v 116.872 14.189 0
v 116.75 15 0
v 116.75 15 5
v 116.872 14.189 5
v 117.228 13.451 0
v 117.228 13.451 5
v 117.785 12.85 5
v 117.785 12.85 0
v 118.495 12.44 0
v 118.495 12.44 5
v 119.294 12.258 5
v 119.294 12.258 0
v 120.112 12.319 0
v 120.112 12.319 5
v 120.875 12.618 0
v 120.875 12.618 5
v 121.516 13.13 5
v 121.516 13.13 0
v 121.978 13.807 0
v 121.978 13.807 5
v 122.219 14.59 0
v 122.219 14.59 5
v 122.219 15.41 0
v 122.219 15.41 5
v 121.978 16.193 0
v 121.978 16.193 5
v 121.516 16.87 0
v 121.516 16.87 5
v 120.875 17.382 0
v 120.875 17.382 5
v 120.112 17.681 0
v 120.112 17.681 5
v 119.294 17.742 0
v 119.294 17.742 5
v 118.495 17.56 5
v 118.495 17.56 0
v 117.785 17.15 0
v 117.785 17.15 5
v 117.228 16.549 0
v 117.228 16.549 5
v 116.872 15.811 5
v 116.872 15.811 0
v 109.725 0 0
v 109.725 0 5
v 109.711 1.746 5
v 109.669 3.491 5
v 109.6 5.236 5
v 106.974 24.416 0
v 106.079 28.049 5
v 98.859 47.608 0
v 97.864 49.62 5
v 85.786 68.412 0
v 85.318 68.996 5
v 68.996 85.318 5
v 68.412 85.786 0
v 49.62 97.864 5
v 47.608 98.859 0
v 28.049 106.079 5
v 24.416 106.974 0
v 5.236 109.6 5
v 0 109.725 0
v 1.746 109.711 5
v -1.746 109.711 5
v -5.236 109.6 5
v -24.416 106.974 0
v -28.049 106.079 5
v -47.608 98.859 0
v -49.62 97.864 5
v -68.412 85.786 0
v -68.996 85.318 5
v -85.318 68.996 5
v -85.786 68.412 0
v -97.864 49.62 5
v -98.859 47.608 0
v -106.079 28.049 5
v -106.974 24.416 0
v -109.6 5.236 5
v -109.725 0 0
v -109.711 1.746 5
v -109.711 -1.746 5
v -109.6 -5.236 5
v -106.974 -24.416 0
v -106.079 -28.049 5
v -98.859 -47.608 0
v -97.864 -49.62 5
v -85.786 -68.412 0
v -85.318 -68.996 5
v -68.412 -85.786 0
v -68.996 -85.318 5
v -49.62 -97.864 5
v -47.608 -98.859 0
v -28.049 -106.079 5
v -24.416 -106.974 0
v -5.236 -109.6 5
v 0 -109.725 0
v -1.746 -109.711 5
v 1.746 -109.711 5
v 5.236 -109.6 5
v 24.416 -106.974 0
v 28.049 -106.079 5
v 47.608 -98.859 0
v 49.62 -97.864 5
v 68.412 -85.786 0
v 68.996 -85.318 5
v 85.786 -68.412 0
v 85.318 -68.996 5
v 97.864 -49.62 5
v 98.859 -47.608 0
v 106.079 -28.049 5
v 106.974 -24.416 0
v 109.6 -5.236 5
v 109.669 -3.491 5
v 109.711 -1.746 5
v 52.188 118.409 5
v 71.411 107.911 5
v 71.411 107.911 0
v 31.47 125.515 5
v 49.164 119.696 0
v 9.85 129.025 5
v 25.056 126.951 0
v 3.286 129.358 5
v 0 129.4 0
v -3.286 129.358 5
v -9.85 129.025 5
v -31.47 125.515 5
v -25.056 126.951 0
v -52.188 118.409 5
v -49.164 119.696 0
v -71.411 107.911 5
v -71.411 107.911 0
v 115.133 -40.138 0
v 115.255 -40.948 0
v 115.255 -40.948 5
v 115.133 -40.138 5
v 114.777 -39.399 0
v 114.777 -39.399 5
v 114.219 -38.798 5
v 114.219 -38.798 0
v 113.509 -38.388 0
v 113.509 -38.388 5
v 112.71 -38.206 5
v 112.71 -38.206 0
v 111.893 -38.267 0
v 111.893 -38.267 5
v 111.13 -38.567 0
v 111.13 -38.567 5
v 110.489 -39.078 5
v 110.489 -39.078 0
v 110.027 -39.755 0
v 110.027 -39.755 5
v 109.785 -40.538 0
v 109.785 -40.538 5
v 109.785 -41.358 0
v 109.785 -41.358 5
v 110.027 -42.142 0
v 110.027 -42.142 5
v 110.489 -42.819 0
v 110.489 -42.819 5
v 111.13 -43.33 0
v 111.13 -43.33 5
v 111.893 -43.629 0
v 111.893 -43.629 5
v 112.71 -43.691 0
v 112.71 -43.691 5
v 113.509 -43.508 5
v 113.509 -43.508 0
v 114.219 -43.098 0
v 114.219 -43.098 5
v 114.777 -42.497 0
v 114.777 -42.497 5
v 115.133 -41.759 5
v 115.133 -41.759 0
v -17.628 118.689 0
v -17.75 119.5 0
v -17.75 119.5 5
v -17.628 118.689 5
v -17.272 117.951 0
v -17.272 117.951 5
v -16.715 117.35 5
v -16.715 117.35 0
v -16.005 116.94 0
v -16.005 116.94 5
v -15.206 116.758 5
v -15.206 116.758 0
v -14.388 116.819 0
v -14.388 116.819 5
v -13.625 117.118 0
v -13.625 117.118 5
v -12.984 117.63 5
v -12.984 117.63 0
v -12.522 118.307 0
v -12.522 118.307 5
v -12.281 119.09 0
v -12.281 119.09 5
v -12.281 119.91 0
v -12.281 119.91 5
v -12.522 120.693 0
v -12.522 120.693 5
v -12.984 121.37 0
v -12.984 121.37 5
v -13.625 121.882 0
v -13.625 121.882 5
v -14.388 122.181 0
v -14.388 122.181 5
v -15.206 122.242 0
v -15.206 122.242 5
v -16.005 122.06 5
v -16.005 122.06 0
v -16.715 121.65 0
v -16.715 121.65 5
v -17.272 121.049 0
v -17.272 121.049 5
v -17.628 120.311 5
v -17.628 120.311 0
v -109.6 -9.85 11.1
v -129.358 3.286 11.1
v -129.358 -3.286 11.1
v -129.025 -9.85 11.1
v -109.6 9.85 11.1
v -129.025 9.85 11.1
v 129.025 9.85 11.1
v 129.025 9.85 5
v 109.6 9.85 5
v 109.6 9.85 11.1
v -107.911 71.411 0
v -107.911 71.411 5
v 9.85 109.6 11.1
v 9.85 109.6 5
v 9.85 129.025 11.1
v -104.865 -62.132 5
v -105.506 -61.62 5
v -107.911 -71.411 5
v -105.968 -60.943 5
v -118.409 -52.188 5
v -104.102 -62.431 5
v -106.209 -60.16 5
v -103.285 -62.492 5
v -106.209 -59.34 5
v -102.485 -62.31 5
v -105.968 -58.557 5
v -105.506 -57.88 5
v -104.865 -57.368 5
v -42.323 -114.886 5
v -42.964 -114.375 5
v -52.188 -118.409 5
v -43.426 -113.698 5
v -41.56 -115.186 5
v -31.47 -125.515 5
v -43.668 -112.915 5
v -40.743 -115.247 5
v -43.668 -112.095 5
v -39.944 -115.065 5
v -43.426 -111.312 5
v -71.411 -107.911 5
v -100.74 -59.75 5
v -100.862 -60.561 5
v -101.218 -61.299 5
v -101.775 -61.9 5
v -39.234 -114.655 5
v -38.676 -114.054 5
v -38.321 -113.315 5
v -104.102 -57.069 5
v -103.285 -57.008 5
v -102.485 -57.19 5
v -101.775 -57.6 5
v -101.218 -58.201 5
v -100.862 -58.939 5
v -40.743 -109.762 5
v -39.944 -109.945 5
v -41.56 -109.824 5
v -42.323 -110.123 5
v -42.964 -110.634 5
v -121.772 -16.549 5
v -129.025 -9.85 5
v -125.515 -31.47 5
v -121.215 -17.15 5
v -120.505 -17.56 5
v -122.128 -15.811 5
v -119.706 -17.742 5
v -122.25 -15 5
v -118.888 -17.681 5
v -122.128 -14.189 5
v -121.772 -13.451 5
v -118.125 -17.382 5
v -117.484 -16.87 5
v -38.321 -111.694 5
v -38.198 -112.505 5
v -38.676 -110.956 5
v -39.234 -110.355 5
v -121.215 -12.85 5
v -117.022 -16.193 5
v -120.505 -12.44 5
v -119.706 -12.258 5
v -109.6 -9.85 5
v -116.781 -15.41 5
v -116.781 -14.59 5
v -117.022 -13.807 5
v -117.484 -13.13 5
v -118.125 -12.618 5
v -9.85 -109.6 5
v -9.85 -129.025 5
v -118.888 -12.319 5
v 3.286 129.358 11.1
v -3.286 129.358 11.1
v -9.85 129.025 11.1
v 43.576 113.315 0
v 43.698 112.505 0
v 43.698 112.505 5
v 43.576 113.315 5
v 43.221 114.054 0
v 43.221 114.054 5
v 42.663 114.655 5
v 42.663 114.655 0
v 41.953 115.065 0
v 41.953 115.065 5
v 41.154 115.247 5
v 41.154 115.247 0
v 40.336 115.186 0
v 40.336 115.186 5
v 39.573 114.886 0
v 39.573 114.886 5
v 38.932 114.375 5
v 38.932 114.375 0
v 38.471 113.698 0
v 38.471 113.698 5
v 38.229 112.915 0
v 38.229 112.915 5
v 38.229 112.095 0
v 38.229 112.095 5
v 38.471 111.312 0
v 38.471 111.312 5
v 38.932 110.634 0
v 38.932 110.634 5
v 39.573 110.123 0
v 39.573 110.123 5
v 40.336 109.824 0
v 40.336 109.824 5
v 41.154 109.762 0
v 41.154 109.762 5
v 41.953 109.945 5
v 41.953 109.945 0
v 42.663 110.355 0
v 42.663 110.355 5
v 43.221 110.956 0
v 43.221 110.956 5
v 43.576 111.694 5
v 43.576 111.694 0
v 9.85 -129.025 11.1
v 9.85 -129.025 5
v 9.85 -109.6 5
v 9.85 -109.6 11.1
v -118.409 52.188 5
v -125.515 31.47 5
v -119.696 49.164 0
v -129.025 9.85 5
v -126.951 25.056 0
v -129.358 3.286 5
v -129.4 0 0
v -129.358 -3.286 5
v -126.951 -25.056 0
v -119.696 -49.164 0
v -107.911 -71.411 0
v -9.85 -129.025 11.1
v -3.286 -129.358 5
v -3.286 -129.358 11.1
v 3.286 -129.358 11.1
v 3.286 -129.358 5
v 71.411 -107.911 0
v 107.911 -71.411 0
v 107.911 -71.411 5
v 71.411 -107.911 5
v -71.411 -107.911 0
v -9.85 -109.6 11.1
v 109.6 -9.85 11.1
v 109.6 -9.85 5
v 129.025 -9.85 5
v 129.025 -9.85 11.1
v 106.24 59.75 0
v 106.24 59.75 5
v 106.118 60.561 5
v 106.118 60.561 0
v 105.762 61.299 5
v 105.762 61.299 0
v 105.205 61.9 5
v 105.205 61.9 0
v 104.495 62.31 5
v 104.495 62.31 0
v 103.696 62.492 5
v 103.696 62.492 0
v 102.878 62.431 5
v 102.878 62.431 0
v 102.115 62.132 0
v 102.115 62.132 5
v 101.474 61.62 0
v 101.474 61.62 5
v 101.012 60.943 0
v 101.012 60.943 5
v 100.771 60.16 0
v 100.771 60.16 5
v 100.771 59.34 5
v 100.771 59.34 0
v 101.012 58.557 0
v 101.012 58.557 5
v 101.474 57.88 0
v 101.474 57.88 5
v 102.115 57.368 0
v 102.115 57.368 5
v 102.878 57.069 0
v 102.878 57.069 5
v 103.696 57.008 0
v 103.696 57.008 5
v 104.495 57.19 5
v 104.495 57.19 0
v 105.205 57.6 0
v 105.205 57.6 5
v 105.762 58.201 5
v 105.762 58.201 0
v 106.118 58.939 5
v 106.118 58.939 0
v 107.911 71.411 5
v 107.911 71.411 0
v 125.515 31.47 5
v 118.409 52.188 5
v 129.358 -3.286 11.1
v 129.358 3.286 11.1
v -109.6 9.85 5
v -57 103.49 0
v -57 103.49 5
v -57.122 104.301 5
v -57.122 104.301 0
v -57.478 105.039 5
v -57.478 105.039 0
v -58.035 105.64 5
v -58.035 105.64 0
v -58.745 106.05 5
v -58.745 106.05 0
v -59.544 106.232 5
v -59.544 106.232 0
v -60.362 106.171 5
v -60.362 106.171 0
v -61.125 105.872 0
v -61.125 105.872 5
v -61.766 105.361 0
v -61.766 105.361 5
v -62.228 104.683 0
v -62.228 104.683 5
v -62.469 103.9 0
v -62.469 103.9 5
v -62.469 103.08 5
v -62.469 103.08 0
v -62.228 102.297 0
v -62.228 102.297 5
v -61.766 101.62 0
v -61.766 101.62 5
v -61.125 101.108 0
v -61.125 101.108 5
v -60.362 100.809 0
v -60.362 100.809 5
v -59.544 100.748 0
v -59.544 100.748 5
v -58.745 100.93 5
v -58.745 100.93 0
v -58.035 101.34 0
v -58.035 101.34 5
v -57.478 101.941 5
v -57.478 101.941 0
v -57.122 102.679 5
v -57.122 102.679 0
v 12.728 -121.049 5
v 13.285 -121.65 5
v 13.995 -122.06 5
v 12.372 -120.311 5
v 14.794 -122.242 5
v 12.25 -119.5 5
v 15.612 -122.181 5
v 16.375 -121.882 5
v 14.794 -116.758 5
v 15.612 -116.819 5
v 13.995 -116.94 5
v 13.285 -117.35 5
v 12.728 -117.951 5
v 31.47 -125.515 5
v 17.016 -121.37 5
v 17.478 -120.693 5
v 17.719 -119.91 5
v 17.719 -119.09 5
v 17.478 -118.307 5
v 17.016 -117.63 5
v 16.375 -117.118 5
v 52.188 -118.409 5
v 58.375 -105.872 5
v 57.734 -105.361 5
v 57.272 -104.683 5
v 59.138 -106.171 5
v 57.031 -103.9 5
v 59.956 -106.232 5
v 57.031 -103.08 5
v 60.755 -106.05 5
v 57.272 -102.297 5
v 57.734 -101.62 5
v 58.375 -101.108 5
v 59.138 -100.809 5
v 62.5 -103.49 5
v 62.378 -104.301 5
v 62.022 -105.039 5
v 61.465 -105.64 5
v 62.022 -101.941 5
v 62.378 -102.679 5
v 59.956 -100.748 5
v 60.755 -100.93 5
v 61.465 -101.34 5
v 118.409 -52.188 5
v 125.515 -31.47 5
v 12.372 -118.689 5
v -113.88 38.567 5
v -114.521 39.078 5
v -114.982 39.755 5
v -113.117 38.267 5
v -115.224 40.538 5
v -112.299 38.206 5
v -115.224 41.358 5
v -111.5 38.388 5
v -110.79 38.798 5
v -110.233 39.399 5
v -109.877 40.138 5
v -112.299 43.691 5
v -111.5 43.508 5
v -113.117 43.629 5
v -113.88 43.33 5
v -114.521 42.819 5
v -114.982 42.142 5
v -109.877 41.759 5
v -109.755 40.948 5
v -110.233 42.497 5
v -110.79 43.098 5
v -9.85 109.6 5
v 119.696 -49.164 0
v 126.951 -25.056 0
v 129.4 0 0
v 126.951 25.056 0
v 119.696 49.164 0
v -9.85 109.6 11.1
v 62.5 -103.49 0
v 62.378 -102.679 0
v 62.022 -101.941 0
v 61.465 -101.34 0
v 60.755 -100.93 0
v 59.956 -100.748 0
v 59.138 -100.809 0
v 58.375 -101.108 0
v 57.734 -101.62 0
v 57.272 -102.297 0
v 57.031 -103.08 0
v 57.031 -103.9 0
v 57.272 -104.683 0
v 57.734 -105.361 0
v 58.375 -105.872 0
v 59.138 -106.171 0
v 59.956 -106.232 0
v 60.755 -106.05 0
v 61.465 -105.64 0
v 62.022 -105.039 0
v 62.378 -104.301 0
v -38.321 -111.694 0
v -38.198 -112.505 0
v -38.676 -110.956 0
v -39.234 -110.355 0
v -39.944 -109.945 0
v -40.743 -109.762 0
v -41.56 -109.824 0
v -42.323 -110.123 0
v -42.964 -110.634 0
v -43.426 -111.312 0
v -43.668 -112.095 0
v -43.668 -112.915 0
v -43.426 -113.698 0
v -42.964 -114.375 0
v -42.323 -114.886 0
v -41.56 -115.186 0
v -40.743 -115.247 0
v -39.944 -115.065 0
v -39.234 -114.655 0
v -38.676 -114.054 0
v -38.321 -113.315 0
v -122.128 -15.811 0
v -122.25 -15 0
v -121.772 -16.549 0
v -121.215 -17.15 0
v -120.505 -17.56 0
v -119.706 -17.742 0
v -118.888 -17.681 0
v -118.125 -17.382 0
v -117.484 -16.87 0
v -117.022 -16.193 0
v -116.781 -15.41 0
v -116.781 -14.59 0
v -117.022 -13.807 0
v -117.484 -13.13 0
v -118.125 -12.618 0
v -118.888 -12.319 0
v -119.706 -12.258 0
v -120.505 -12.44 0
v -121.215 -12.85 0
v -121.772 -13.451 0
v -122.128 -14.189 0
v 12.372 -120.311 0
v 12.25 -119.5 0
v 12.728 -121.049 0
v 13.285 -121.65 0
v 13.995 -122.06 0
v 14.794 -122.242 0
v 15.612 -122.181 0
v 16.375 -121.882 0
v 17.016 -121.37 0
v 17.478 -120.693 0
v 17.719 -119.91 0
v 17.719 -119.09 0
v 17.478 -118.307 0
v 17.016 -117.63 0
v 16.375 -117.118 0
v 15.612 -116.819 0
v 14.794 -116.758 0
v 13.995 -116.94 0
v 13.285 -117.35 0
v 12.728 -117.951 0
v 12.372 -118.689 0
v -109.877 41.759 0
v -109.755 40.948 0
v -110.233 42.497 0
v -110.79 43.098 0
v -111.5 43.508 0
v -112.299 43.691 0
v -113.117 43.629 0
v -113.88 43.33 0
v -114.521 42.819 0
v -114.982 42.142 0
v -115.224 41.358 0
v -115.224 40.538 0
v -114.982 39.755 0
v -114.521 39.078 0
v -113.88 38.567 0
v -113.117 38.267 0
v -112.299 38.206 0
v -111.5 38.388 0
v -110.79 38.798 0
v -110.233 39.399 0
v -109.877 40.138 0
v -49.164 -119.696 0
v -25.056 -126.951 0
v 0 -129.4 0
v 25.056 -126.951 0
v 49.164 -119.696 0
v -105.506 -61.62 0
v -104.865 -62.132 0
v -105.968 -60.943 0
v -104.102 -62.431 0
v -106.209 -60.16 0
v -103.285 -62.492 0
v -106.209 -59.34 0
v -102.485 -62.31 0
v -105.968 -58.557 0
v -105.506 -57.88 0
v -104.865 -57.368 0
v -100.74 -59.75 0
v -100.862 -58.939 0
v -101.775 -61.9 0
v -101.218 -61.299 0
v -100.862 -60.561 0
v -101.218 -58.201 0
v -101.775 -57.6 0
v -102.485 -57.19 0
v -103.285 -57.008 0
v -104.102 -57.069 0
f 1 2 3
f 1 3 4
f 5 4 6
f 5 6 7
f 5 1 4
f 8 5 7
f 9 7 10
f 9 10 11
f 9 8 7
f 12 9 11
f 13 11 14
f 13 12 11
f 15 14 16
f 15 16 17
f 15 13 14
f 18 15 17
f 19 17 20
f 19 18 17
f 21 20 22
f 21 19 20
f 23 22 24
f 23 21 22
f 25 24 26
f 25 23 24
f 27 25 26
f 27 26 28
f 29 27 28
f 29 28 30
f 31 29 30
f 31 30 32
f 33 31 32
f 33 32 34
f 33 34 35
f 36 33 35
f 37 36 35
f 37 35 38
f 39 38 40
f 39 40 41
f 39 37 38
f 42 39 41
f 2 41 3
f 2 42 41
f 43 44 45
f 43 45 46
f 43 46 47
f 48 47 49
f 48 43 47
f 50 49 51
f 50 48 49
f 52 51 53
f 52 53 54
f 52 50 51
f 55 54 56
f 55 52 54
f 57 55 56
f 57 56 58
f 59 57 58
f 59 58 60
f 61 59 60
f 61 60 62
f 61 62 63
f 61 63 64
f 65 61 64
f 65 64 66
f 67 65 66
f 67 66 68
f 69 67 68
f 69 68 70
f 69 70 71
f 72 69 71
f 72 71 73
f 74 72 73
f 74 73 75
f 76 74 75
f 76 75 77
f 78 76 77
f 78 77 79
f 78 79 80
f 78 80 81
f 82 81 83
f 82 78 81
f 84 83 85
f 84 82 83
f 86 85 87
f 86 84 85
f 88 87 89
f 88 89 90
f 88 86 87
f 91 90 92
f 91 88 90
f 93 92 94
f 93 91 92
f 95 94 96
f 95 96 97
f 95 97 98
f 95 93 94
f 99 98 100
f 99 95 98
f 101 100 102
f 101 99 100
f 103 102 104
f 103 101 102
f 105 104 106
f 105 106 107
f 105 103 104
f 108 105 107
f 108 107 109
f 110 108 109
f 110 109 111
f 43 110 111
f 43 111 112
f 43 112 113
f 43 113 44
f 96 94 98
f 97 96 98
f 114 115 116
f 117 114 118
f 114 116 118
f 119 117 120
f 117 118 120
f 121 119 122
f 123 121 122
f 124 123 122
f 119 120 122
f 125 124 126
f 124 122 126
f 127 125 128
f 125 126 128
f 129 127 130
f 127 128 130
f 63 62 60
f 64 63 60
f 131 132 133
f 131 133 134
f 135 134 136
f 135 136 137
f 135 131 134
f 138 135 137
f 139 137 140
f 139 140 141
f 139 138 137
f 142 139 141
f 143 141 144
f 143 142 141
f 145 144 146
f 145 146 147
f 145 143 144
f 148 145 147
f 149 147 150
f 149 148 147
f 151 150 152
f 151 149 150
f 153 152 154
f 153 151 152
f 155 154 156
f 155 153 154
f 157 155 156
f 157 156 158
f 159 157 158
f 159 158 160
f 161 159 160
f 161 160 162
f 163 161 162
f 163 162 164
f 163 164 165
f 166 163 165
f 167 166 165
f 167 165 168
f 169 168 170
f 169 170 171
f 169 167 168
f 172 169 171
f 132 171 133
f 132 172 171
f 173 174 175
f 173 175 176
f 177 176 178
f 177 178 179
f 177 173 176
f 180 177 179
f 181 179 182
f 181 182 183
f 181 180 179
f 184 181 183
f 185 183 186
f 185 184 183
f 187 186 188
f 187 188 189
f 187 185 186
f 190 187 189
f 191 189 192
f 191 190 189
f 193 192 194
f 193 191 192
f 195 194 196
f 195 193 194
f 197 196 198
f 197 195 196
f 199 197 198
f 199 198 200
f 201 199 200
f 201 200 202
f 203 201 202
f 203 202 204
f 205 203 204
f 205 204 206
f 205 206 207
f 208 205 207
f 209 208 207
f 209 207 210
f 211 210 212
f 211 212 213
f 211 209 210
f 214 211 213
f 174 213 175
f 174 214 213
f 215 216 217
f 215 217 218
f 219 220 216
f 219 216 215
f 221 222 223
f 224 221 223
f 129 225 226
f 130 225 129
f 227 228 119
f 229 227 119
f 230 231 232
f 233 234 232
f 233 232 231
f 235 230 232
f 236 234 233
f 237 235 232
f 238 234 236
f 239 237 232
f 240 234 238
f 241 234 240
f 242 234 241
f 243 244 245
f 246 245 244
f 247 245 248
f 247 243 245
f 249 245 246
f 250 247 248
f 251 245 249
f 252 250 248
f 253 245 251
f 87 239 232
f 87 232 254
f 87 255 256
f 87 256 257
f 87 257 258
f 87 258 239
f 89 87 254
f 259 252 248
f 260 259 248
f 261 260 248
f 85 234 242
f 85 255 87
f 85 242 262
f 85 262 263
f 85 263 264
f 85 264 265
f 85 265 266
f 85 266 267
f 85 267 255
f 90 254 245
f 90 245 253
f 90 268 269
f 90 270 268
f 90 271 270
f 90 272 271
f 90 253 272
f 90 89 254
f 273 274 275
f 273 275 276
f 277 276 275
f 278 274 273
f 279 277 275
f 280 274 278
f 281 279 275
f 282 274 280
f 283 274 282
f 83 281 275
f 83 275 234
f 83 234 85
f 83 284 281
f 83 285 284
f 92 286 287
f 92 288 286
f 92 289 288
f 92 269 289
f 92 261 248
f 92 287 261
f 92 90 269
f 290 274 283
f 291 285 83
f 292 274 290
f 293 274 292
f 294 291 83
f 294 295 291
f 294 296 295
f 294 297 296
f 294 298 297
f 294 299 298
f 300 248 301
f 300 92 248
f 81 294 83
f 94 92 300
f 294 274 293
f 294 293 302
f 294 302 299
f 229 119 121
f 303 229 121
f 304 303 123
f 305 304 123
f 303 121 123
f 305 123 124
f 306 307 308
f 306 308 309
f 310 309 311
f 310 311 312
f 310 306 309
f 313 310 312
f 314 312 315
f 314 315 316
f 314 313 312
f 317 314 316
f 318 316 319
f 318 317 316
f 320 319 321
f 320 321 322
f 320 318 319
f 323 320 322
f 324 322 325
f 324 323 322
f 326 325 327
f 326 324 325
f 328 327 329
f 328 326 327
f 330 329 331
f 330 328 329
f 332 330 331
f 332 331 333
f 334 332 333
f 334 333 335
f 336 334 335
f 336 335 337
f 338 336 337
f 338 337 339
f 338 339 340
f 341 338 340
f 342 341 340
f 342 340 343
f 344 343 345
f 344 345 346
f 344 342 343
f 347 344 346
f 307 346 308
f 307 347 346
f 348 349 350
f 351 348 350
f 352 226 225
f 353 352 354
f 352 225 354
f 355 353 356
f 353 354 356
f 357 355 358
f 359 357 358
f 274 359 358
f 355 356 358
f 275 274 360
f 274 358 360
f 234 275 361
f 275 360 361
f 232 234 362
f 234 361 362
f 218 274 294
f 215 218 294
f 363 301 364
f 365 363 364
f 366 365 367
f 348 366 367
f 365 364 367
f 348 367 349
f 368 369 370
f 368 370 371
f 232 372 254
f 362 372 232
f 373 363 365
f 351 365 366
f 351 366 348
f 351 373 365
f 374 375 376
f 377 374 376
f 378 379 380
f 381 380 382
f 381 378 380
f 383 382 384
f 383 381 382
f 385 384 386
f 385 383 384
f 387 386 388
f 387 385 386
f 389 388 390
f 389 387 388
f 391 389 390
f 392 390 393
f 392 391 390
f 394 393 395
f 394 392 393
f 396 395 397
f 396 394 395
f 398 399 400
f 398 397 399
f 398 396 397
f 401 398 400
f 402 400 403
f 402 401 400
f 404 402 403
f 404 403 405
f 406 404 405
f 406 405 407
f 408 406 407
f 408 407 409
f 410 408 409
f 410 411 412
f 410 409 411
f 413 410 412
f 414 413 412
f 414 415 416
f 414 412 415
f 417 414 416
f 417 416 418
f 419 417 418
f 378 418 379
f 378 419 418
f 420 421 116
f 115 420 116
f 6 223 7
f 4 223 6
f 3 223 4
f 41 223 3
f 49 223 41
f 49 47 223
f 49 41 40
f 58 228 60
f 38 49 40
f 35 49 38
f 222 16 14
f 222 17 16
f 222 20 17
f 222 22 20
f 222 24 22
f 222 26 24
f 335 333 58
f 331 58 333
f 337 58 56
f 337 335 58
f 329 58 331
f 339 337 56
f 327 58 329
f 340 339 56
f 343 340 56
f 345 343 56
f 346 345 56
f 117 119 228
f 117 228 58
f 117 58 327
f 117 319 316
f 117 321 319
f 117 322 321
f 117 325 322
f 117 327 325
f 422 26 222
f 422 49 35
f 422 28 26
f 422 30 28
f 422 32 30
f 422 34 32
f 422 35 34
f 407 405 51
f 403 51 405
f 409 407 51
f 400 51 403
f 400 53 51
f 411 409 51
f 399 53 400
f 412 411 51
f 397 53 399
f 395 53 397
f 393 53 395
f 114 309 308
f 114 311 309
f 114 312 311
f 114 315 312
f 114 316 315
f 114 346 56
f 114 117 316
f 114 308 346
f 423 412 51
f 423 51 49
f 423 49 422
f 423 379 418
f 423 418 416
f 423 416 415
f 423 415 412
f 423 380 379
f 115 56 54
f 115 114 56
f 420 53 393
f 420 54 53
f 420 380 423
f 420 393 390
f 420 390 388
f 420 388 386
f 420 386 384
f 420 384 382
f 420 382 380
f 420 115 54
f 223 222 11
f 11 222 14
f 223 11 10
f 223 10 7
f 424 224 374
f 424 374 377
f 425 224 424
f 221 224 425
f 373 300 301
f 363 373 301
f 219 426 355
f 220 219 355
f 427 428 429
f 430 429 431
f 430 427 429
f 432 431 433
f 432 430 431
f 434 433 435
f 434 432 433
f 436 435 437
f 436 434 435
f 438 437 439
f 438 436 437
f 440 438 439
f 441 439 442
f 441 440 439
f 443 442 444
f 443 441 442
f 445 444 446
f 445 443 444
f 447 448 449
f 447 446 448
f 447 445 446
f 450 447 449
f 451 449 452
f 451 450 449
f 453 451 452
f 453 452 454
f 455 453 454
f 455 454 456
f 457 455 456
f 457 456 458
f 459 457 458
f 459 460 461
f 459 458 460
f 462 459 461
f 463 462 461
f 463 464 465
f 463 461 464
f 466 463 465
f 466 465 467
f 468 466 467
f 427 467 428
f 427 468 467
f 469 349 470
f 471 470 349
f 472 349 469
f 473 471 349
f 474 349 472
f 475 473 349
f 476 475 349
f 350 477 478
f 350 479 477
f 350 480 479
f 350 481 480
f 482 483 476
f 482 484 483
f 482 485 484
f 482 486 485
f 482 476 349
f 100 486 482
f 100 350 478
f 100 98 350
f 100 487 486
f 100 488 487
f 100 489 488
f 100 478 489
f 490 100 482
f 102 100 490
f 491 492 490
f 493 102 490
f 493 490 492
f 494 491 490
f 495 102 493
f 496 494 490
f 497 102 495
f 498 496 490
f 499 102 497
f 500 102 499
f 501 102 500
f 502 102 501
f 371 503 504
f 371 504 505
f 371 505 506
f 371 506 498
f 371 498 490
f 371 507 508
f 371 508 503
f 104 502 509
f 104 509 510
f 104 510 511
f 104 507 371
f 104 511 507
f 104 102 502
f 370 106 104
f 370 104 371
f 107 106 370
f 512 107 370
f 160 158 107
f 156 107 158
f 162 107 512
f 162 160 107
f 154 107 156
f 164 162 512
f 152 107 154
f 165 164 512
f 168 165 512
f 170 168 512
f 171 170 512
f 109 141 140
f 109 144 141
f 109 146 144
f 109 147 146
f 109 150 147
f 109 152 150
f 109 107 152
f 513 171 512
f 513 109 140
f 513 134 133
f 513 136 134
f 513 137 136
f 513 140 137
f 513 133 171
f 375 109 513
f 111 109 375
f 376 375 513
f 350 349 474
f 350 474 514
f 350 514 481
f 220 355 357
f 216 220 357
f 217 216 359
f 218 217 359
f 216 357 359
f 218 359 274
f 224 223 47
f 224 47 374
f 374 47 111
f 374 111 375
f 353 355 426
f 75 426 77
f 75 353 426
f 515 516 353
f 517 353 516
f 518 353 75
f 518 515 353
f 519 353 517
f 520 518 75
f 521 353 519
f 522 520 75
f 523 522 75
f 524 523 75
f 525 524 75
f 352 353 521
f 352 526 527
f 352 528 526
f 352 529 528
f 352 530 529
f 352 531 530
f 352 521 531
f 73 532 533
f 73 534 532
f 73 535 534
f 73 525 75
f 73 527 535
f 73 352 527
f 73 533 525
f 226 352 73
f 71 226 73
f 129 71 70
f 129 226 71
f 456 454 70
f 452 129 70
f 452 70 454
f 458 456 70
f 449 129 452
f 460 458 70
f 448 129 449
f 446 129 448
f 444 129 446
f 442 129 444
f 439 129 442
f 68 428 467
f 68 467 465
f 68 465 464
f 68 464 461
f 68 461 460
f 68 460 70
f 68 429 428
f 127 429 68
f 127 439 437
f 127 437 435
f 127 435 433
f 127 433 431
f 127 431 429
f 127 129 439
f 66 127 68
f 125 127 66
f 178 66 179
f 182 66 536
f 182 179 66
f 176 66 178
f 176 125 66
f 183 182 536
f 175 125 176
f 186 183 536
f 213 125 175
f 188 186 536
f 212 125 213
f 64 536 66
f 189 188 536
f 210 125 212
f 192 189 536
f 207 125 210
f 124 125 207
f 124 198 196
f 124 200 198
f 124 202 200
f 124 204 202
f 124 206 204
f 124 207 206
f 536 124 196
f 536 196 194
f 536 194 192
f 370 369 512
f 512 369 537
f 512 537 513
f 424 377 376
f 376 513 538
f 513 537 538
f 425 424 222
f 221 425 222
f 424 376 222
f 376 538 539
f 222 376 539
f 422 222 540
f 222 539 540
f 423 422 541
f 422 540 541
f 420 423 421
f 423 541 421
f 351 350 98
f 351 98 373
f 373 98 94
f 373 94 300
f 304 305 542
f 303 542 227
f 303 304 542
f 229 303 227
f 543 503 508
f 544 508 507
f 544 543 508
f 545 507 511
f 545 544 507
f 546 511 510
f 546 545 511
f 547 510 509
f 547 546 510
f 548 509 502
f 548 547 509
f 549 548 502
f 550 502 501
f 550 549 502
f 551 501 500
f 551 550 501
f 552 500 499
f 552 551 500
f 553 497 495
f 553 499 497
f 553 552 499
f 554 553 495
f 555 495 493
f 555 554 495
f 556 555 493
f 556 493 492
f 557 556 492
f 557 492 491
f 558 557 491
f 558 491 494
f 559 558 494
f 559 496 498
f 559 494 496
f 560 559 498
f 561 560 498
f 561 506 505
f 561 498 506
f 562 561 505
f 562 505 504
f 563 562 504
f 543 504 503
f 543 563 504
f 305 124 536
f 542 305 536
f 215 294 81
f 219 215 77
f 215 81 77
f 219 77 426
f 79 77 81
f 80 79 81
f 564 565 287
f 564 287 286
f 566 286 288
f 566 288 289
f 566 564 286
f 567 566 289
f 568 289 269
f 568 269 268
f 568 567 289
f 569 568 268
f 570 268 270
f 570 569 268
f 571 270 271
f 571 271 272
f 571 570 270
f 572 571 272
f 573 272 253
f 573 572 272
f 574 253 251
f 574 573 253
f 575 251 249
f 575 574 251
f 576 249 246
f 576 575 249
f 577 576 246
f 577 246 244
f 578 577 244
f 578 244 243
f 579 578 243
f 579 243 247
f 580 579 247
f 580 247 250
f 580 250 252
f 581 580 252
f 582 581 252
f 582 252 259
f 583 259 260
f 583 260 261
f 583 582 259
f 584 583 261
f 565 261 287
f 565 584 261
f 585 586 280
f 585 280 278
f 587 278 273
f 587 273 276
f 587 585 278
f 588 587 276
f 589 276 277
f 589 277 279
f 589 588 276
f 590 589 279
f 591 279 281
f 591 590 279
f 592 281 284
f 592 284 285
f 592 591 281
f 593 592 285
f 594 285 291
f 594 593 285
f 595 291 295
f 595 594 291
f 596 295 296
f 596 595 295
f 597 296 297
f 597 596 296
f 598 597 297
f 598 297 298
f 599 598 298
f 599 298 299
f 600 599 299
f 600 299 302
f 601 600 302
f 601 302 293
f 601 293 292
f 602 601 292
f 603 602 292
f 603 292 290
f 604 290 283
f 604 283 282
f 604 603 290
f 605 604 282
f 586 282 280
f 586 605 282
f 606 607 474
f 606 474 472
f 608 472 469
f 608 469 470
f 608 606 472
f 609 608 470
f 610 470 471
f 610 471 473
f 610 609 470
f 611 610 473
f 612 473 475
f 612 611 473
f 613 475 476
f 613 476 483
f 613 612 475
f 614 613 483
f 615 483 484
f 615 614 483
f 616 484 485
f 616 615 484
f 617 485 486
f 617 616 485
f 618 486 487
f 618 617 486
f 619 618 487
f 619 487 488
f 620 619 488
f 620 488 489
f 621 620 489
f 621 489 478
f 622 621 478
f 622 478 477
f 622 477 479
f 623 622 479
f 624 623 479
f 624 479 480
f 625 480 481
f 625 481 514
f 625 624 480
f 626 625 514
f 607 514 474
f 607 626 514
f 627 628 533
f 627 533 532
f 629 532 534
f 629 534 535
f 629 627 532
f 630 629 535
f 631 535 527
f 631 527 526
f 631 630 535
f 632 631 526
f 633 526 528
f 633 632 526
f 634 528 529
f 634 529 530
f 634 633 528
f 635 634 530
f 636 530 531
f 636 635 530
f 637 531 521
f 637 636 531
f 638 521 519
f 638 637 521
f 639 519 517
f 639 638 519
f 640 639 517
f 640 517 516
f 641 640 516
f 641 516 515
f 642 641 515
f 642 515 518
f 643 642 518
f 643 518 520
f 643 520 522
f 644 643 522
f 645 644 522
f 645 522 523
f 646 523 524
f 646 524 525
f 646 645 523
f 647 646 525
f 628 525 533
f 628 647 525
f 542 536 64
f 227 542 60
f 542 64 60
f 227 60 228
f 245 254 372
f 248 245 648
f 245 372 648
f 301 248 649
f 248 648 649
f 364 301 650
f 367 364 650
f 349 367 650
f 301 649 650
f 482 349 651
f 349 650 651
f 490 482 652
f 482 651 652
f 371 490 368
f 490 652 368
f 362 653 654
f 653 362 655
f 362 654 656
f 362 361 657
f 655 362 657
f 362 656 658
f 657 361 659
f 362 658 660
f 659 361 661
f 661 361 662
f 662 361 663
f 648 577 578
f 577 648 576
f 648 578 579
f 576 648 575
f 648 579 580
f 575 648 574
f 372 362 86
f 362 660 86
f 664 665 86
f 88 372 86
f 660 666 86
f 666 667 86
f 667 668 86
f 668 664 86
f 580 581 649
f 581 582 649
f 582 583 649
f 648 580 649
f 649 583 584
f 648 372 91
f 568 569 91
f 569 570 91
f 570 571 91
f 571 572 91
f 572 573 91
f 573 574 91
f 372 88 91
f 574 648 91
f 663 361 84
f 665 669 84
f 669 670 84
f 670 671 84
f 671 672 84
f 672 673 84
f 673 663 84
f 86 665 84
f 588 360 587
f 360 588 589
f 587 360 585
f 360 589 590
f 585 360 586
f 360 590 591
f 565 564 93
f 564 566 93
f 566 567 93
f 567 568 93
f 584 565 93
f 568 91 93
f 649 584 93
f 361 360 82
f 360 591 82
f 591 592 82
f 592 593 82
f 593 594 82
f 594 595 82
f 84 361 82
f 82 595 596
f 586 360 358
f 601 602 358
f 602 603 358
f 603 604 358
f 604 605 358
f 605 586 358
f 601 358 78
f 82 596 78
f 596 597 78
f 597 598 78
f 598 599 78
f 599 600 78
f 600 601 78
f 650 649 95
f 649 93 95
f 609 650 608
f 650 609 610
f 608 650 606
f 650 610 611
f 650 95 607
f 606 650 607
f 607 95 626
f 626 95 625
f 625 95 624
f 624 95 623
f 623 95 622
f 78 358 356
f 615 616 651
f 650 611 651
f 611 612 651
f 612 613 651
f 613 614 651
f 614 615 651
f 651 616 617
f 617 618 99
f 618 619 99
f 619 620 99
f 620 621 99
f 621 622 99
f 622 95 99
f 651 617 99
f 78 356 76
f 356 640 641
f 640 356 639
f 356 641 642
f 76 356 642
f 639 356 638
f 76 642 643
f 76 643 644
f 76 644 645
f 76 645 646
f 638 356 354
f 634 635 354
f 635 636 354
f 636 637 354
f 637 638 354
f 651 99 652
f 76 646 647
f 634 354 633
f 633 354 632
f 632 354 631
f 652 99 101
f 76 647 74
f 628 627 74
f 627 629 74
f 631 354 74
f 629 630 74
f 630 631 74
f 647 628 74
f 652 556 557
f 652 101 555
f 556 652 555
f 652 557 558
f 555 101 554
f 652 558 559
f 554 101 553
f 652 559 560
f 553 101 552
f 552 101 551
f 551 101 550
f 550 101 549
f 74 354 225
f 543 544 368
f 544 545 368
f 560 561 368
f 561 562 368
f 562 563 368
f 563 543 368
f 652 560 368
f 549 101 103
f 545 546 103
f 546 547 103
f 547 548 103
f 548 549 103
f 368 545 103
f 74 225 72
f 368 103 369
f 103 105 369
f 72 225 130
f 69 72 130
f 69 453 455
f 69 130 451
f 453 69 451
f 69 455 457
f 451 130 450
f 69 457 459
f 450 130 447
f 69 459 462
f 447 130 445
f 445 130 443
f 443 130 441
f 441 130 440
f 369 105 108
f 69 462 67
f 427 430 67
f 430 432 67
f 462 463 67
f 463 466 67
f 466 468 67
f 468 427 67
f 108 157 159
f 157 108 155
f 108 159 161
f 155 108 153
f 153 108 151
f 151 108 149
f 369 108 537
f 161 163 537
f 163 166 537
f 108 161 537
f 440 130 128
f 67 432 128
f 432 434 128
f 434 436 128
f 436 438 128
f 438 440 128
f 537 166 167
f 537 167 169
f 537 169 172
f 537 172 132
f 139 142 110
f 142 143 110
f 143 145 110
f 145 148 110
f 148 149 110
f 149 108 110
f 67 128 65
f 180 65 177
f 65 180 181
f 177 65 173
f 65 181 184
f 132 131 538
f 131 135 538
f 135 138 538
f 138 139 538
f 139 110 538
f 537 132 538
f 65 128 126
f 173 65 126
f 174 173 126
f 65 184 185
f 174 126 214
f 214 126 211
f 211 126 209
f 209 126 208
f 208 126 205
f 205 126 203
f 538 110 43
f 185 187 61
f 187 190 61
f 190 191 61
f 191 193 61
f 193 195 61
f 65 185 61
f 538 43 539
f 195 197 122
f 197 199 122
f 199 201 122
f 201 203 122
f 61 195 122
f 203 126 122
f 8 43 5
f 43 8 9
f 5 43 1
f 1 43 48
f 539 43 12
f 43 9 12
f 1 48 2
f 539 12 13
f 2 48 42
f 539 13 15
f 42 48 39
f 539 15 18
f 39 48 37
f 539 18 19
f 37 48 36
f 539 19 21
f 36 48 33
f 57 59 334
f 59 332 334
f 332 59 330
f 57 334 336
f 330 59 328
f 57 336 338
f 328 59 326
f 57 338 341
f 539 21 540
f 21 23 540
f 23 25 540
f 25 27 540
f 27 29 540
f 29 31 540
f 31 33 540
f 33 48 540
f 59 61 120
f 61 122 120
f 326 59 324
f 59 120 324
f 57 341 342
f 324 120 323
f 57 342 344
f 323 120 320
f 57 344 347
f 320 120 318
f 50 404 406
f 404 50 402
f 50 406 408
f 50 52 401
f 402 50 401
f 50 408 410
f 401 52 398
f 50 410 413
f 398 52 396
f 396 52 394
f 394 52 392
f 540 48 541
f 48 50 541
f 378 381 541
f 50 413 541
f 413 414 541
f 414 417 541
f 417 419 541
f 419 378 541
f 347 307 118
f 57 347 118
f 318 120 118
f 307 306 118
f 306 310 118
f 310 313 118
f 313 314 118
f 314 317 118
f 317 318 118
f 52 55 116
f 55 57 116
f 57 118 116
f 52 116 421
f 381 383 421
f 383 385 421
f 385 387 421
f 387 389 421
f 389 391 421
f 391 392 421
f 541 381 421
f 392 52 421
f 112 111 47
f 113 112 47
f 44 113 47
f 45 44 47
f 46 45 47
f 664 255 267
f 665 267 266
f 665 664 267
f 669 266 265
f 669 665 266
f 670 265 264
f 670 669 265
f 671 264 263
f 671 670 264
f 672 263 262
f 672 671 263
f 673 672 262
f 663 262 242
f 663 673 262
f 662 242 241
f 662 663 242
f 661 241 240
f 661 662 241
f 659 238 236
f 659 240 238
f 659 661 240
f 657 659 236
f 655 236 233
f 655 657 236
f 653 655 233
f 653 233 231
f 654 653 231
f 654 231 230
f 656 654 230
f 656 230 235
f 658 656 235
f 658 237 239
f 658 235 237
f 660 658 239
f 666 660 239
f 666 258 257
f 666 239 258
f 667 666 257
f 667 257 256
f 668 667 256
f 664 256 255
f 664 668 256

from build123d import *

# Parameters (mm, degrees)
SKETCH2_R           = 129.4
SKETCH2_R_2         = 109.725
SKETCH2_R_3         = 2.75
BOSS_EXTRUDE1_DEPTH = 5
BOSS_EXTRUDE2_DEPTH = 6.1
CUT_EXTRUDE3_DEPTH  = 10
SKETCH5_R           = 2.75
CUT_EXTRUDE4_DEPTH  = 184.335566653


with BuildPart() as part:
    # Sketch2 → Boss-Extrude1 (new body)
    with BuildSketch(Plane.XY):
        Circle(SKETCH2_R)
        Circle(SKETCH2_R_2, mode=Mode.SUBTRACT)
        with Locations(Location((-15, 119.5, 0), (0, 0, 180))):
            Circle(SKETCH2_R_3, mode=Mode.SUBTRACT)
        with Locations((40.94836166, 112.504699024)):
            Circle(SKETCH2_R_3, mode=Mode.SUBTRACT)
        with Locations(Location((119.5, 15, 0), (0, 0, 180))):
            Circle(SKETCH2_R_3, mode=Mode.SUBTRACT)
        with Locations((112.504699024, -40.94836166)):
            Circle(SKETCH2_R_3, mode=Mode.SUBTRACT)
        with Locations(Location((15, -119.5, 0), (0, 0, 180))):
            Circle(SKETCH2_R_3, mode=Mode.SUBTRACT)
        with Locations((-40.94836166, -112.504699024)):
            Circle(SKETCH2_R_3, mode=Mode.SUBTRACT)
        with Locations(Location((-119.5, -15, 0), (0, 0, 180))):
            Circle(SKETCH2_R_3, mode=Mode.SUBTRACT)
        with Locations((-112.504699024, 40.94836166)):
            Circle(SKETCH2_R_3, mode=Mode.SUBTRACT)
    extrude(amount=BOSS_EXTRUDE1_DEPTH)

    # Sketch3 → Boss-Extrude2 (add)
    with BuildSketch(Plane.XY.offset(5)):
        with BuildLine():
            Line((-9.85, 129.024561615), (-9.85, 109.6))
            Line((-9.85, 109.6), (9.85, 109.6))
            Line((9.85, 109.6), (9.85, 129.024561615))
            ThreePointArc((9.85, 129.024561615), (0, 129.4), (-9.85, 129.024561615))
        make_face()
        with BuildLine():
            Line((129.024561615, 9.85), (109.6, 9.85))
            Line((109.6, 9.85), (109.6, -9.85))
            Line((109.6, -9.85), (129.024561615, -9.85))
            ThreePointArc((129.024561615, -9.85), (129.4, 0), (129.024561615, 9.85))
        make_face()
        with BuildLine():
            Line((9.85, -129.024561615), (9.85, -109.6))
            Line((9.85, -109.6), (-9.85, -109.6))
            Line((-9.85, -109.6), (-9.85, -129.024561615))
            ThreePointArc((-9.85, -129.024561615), (0, -129.4), (9.85, -129.024561615))
        make_face()
        with BuildLine():
            Line((-129.024561615, -9.85), (-109.6, -9.85))
            Line((-109.6, -9.85), (-109.6, 9.85))
            Line((-109.6, 9.85), (-129.024561615, 9.85))
            ThreePointArc((-129.024561615, 9.85), (-129.4, 0), (-129.024561615, -9.85))
        make_face()
    extrude(amount=BOSS_EXTRUDE2_DEPTH)

    # Sketch4 → Cut-Extrude3 (cut)
    with BuildSketch(Plane.XY):
        Polygon((126.8, 52.522279709), (52.522279709, 126.8), (53.640656327, 129.5), (129.5, 53.640656327), align=None)
        Polygon((-53.640656327, 129.5), (-129.5, 53.640656327), (-126.8, 52.522279709), (-52.522279709, 126.8), align=None)
        Polygon((-129.5, -53.640656327), (-53.640656327, -129.5), (-52.522279709, -126.8), (-126.8, -52.522279709), align=None)
        Polygon((53.640656327, -129.5), (129.5, -53.640656327), (126.8, -52.522279709), (52.522279709, -126.8), align=None)
    extrude(amount=CUT_EXTRUDE3_DEPTH, mode=Mode.SUBTRACT)

    # Sketch5 → Cut-Extrude4 (cut, through all)
    with BuildSketch(Plane.XY):
        with Locations((103.490035752, 59.75)):
            Circle(SKETCH5_R)
        with Locations((59.75, -103.490035752)):
            Circle(SKETCH5_R)
        with Locations((-103.490035752, -59.75)):
            Circle(SKETCH5_R)
        with Locations((-59.75, 103.490035752)):
            Circle(SKETCH5_R)
    extrude(amount=CUT_EXTRUDE4_DEPTH, mode=Mode.SUBTRACT)


solid = part.part
